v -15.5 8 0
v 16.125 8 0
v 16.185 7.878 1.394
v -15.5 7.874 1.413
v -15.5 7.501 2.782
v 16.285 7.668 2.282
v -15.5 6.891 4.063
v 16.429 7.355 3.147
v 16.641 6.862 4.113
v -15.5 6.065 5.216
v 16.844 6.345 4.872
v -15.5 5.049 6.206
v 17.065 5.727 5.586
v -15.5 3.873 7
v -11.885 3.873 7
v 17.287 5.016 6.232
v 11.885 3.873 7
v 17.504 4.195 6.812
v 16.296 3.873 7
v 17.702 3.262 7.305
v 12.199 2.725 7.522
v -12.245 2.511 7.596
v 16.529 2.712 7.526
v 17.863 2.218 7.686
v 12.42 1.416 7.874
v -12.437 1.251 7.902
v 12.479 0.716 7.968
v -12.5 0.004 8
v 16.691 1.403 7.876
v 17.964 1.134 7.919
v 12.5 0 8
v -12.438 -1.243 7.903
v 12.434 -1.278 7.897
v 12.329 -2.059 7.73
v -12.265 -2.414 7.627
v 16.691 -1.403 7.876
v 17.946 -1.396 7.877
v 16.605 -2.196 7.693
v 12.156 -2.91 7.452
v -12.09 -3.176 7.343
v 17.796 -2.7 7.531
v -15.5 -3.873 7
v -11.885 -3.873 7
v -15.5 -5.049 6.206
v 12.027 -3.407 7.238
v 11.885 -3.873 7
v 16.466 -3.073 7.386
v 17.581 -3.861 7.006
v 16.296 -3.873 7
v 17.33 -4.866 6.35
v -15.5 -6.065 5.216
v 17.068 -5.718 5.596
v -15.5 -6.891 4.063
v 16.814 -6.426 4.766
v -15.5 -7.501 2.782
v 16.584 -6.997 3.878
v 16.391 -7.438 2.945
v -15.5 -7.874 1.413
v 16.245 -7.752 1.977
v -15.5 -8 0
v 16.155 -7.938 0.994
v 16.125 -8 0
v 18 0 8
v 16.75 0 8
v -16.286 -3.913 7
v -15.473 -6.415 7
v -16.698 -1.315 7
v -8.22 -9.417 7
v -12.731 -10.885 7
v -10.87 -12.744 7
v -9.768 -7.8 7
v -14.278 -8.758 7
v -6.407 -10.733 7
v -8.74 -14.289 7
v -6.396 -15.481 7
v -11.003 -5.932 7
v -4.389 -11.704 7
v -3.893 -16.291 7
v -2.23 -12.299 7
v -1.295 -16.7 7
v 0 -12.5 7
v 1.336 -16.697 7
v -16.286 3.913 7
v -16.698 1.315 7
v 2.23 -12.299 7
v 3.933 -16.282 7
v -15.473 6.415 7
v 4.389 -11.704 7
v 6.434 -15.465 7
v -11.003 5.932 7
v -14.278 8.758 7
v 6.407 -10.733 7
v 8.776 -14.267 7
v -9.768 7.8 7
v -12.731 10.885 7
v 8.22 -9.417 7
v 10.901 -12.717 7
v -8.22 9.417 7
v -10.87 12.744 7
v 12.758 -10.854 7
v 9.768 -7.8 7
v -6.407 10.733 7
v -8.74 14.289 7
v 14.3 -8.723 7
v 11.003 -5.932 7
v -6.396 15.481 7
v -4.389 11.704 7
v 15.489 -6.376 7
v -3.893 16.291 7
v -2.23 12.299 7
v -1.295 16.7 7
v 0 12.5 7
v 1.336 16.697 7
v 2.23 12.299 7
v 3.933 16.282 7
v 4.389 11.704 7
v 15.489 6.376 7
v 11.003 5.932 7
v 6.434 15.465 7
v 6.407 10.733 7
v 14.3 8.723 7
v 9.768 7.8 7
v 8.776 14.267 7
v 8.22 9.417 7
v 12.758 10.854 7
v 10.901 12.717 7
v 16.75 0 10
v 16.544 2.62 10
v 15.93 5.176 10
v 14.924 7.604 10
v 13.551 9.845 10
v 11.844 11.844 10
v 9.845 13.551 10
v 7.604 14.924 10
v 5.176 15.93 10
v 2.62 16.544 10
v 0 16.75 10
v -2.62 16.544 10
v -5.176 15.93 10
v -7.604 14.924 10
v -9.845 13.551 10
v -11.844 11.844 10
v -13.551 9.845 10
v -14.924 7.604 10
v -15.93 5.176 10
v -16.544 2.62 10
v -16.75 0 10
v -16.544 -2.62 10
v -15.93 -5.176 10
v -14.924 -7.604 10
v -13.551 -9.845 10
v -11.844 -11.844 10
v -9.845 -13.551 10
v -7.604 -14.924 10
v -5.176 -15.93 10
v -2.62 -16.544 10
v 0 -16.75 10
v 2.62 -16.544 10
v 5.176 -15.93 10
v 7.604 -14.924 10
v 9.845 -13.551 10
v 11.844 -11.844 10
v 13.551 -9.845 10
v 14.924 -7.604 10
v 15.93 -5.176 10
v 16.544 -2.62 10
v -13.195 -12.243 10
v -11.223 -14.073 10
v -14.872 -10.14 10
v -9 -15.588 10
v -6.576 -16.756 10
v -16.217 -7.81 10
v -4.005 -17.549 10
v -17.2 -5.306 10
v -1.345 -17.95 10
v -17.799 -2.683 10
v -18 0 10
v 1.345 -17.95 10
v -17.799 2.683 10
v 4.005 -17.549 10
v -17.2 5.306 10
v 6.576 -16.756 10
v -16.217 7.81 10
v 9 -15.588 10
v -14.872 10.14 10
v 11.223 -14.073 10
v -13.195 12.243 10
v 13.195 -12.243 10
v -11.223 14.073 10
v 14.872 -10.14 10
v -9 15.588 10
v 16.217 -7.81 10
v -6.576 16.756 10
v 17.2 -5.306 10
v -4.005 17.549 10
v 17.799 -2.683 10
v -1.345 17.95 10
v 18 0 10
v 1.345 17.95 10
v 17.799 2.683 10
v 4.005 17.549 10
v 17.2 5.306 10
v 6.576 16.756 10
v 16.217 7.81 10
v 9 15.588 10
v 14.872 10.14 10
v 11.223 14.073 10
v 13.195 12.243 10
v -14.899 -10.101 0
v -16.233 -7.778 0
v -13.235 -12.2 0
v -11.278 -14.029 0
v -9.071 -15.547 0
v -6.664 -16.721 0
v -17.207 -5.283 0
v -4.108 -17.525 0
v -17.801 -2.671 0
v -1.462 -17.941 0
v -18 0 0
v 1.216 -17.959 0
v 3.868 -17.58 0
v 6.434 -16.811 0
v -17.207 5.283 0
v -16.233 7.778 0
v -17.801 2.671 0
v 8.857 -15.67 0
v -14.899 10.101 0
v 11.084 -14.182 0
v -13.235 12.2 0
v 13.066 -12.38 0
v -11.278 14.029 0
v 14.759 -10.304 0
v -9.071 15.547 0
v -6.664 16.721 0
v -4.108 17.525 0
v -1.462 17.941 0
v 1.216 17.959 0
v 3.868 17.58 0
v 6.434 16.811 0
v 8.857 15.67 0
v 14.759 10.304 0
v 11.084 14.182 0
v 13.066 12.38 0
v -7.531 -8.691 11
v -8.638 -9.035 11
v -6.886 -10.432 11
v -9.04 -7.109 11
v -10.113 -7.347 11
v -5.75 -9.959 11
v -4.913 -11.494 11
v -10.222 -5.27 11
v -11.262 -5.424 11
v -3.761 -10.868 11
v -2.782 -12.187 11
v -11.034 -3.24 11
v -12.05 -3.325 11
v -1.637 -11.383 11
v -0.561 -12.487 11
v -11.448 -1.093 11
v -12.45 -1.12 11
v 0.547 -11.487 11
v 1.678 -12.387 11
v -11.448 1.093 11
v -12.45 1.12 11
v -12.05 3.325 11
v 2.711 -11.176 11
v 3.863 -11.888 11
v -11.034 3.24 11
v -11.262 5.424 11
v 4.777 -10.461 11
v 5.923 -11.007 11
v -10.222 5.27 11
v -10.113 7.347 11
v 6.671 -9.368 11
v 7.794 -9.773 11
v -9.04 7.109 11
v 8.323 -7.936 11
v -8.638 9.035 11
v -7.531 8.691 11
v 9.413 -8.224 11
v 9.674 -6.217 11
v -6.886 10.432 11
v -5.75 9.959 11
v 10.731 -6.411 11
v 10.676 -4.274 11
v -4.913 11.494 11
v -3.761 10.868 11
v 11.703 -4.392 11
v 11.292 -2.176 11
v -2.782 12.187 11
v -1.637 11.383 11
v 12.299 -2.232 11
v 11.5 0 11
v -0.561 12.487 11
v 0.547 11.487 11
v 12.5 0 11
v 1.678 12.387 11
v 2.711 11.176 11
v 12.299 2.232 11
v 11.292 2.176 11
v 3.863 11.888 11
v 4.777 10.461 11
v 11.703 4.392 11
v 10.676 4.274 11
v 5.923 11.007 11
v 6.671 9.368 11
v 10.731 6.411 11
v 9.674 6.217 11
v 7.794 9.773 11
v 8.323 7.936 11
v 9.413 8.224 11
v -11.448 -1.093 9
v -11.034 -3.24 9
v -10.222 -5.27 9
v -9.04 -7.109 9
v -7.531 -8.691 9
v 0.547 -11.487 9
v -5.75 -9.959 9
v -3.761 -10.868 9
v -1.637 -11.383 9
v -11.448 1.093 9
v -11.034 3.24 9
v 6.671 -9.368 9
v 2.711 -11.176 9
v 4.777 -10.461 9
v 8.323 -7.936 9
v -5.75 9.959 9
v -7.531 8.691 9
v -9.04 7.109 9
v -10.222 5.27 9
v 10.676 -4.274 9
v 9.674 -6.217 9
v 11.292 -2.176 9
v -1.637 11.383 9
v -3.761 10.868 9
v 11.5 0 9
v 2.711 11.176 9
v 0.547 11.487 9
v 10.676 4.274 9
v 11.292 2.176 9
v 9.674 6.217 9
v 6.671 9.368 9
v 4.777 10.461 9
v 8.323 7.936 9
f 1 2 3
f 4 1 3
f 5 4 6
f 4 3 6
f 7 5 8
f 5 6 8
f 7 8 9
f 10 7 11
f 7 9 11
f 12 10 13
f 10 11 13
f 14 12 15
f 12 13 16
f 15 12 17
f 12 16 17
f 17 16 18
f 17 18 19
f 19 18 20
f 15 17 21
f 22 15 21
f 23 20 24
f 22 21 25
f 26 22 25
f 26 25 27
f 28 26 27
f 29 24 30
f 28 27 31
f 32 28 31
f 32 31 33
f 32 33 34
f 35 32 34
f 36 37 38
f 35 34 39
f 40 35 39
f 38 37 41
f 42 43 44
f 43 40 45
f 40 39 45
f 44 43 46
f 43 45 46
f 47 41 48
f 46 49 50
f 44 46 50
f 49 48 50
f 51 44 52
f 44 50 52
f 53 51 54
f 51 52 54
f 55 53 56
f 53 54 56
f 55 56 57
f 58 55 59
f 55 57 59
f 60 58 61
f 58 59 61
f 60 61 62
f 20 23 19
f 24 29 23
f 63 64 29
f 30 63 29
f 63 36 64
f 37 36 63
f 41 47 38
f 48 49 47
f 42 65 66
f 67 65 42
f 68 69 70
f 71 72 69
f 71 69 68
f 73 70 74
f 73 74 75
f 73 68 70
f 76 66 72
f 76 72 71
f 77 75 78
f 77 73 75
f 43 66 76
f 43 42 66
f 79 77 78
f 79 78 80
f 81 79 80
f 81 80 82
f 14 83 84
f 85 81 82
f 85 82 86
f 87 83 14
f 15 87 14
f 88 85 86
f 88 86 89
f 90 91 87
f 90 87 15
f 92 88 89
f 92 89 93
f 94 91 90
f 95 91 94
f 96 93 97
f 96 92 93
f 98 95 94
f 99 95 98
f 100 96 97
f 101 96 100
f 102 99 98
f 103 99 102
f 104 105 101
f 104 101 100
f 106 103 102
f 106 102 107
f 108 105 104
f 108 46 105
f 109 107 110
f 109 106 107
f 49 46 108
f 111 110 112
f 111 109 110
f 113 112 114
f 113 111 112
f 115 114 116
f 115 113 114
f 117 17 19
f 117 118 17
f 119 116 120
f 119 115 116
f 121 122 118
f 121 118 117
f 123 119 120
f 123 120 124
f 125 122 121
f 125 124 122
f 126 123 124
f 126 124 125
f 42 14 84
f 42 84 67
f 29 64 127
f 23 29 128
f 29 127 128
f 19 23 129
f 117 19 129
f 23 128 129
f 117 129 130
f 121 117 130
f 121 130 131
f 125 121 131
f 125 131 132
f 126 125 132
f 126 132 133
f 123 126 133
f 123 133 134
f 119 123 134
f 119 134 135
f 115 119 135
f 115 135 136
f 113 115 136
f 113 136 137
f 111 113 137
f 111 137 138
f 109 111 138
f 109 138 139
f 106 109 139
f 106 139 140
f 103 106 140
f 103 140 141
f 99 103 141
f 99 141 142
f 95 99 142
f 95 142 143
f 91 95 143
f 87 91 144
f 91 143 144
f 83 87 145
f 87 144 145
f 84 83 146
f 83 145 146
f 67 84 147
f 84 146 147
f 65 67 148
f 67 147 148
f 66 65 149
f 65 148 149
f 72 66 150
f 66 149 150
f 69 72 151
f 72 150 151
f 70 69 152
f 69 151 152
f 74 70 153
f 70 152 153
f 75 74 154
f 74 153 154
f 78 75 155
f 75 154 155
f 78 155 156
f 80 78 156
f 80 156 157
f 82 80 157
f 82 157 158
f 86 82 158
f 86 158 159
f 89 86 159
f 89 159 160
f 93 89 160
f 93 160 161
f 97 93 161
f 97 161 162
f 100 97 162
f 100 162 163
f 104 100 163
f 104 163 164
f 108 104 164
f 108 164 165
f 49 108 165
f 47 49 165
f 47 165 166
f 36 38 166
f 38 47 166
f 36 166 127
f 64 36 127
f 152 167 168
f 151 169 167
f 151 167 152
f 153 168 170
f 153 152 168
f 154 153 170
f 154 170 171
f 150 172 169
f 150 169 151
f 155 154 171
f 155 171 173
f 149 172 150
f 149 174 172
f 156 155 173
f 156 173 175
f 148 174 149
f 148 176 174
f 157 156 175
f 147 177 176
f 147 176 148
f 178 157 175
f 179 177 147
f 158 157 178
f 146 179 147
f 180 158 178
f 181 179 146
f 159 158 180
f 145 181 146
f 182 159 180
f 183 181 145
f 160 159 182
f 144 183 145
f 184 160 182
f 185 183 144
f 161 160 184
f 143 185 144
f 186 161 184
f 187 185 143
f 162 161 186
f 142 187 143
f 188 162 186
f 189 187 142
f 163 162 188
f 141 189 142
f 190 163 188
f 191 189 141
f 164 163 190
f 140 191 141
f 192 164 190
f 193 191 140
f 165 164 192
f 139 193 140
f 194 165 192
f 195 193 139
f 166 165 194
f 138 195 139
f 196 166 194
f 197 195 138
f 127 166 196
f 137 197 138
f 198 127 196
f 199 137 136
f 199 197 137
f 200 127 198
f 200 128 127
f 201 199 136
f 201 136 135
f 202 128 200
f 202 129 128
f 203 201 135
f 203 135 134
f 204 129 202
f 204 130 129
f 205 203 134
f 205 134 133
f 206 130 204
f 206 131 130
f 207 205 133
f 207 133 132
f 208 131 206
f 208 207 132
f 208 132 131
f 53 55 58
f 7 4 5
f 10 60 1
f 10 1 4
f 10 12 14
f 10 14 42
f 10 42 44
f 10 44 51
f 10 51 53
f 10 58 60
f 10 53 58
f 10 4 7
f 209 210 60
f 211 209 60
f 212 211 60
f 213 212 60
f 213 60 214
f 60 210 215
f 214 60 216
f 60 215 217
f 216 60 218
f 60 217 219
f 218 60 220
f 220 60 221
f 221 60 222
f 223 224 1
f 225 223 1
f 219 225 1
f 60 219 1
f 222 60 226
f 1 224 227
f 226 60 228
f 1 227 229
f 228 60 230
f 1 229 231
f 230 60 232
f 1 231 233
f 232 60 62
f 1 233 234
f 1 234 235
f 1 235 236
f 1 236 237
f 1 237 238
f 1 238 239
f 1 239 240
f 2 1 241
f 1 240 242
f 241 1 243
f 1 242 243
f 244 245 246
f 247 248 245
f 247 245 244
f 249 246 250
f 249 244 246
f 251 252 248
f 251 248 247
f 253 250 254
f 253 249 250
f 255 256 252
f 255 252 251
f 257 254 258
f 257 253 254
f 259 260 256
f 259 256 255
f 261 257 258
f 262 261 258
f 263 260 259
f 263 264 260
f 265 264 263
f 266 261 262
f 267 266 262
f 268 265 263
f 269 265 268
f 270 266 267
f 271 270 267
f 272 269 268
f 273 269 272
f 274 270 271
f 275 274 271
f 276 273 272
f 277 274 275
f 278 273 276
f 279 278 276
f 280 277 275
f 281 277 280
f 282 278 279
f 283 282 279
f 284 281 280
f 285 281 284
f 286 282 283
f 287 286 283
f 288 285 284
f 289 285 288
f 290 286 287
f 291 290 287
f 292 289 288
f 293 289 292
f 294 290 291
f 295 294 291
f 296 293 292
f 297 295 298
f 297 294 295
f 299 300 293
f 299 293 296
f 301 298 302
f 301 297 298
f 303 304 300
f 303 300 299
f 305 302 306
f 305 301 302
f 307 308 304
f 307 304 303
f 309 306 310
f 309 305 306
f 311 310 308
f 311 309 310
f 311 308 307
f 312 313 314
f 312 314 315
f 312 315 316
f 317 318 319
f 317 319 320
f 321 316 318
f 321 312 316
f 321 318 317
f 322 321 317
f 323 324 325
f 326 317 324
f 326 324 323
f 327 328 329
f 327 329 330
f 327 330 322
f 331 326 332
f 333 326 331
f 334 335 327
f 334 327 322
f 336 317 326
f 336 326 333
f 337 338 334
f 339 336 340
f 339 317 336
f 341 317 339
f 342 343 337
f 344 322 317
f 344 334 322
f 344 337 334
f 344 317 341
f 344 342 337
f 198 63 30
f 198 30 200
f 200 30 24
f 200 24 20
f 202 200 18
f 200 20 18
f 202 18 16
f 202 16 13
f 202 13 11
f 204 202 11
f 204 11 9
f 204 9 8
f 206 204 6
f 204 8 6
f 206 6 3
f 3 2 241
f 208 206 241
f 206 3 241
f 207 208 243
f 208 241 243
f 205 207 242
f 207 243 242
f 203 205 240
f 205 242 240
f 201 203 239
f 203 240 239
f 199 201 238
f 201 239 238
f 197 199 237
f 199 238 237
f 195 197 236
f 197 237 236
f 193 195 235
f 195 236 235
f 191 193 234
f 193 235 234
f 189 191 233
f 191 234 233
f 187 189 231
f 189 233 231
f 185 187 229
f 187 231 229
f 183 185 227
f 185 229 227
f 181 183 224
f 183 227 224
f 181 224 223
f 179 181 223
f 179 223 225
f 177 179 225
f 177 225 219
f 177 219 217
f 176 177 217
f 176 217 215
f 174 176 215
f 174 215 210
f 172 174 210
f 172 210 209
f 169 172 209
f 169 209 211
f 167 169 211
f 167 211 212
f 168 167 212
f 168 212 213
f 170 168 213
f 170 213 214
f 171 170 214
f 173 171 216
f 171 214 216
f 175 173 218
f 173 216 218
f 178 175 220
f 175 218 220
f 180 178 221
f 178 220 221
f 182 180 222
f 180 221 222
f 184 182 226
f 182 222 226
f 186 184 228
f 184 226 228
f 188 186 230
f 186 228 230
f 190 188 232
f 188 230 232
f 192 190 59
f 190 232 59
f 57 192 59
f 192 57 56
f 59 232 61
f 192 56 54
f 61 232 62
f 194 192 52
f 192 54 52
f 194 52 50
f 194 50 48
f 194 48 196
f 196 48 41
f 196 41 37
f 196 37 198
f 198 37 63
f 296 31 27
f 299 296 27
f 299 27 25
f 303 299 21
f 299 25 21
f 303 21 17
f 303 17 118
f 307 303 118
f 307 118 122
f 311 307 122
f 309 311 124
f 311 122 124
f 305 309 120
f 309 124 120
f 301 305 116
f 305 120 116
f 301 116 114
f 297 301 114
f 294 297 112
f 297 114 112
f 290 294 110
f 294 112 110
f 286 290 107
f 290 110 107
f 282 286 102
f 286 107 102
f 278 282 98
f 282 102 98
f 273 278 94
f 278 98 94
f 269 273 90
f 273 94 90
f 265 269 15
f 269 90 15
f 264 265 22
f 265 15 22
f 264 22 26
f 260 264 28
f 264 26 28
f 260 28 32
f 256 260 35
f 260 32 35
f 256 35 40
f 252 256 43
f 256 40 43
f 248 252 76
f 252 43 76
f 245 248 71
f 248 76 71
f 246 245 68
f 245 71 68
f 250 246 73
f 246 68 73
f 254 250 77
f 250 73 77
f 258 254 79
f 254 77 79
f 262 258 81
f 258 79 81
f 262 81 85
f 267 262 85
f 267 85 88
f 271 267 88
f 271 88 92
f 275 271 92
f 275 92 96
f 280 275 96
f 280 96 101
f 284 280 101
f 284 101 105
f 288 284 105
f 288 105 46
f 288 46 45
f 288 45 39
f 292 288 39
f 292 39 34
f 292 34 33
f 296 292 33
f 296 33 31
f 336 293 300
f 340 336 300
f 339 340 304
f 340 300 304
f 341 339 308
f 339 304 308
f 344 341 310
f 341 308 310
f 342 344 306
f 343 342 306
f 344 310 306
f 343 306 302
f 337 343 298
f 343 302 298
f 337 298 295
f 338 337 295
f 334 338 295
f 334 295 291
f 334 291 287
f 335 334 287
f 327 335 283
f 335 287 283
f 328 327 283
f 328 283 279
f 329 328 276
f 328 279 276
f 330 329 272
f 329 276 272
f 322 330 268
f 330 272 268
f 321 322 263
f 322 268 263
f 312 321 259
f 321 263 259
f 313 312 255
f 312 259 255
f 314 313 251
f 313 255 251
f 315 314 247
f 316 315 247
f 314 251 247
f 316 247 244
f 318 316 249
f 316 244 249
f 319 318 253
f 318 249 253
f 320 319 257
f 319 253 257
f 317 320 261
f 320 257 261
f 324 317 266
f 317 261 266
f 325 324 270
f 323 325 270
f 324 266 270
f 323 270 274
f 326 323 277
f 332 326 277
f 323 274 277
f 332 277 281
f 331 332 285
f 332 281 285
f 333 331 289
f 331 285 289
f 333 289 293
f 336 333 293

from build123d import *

# Parameters (mm, degrees)
F0_R      = 18
F0_R_2    = 16.75
F0_R_3    = 12.5
F0_R_4    = 11.5
F1_DEPTH  = 10
F2_R      = 16.75
F3_DEPTH  = 3
F4_R      = 12.5
F5_DEPTH  = 4
F6_R      = 11.5
F7_DEPTH  = 2
F9_R      = 8
F10_DEPTH = 33.5


# Not quite as in the source:
# - the program builds the solid bodies; features that only make, move or delete a surface that nothing else refers to are left out


with BuildPart() as f1:
    # F0 (on Top) → F1 (new body)
    with BuildSketch(Plane.XY):
        Circle(F0_R)
        Circle(F0_R_2, mode=Mode.SUBTRACT)
        Circle(F0_R_2)
        Circle(F0_R_3, mode=Mode.SUBTRACT)
        Circle(F0_R_3)
        Circle(F0_R_4, mode=Mode.SUBTRACT)
        Circle(F0_R_4)
    extrude(amount=F1_DEPTH)

    # F2 (on face) → F3 (cut)
    with BuildSketch(Plane.XY.offset(10)):
        Circle(F2_R)
    extrude(amount=-F3_DEPTH, mode=Mode.SUBTRACT)

    # F4 (on face) → F5 (join)
    with BuildSketch(Plane.XY.offset(7)):
        Circle(F4_R)
    extrude(amount=F5_DEPTH)

    # F6 (on face) → F7 (cut)
    with BuildSketch(Plane.XY.offset(11)):
        Circle(F6_R)
    extrude(amount=-F7_DEPTH, mode=Mode.SUBTRACT)

    # F9 (on offset) → F10 (cut)
    with BuildSketch(Plane.YZ.offset(18)):
        Circle(F9_R)
    extrude(amount=-F10_DEPTH, mode=Mode.SUBTRACT)


solid = f1.part
